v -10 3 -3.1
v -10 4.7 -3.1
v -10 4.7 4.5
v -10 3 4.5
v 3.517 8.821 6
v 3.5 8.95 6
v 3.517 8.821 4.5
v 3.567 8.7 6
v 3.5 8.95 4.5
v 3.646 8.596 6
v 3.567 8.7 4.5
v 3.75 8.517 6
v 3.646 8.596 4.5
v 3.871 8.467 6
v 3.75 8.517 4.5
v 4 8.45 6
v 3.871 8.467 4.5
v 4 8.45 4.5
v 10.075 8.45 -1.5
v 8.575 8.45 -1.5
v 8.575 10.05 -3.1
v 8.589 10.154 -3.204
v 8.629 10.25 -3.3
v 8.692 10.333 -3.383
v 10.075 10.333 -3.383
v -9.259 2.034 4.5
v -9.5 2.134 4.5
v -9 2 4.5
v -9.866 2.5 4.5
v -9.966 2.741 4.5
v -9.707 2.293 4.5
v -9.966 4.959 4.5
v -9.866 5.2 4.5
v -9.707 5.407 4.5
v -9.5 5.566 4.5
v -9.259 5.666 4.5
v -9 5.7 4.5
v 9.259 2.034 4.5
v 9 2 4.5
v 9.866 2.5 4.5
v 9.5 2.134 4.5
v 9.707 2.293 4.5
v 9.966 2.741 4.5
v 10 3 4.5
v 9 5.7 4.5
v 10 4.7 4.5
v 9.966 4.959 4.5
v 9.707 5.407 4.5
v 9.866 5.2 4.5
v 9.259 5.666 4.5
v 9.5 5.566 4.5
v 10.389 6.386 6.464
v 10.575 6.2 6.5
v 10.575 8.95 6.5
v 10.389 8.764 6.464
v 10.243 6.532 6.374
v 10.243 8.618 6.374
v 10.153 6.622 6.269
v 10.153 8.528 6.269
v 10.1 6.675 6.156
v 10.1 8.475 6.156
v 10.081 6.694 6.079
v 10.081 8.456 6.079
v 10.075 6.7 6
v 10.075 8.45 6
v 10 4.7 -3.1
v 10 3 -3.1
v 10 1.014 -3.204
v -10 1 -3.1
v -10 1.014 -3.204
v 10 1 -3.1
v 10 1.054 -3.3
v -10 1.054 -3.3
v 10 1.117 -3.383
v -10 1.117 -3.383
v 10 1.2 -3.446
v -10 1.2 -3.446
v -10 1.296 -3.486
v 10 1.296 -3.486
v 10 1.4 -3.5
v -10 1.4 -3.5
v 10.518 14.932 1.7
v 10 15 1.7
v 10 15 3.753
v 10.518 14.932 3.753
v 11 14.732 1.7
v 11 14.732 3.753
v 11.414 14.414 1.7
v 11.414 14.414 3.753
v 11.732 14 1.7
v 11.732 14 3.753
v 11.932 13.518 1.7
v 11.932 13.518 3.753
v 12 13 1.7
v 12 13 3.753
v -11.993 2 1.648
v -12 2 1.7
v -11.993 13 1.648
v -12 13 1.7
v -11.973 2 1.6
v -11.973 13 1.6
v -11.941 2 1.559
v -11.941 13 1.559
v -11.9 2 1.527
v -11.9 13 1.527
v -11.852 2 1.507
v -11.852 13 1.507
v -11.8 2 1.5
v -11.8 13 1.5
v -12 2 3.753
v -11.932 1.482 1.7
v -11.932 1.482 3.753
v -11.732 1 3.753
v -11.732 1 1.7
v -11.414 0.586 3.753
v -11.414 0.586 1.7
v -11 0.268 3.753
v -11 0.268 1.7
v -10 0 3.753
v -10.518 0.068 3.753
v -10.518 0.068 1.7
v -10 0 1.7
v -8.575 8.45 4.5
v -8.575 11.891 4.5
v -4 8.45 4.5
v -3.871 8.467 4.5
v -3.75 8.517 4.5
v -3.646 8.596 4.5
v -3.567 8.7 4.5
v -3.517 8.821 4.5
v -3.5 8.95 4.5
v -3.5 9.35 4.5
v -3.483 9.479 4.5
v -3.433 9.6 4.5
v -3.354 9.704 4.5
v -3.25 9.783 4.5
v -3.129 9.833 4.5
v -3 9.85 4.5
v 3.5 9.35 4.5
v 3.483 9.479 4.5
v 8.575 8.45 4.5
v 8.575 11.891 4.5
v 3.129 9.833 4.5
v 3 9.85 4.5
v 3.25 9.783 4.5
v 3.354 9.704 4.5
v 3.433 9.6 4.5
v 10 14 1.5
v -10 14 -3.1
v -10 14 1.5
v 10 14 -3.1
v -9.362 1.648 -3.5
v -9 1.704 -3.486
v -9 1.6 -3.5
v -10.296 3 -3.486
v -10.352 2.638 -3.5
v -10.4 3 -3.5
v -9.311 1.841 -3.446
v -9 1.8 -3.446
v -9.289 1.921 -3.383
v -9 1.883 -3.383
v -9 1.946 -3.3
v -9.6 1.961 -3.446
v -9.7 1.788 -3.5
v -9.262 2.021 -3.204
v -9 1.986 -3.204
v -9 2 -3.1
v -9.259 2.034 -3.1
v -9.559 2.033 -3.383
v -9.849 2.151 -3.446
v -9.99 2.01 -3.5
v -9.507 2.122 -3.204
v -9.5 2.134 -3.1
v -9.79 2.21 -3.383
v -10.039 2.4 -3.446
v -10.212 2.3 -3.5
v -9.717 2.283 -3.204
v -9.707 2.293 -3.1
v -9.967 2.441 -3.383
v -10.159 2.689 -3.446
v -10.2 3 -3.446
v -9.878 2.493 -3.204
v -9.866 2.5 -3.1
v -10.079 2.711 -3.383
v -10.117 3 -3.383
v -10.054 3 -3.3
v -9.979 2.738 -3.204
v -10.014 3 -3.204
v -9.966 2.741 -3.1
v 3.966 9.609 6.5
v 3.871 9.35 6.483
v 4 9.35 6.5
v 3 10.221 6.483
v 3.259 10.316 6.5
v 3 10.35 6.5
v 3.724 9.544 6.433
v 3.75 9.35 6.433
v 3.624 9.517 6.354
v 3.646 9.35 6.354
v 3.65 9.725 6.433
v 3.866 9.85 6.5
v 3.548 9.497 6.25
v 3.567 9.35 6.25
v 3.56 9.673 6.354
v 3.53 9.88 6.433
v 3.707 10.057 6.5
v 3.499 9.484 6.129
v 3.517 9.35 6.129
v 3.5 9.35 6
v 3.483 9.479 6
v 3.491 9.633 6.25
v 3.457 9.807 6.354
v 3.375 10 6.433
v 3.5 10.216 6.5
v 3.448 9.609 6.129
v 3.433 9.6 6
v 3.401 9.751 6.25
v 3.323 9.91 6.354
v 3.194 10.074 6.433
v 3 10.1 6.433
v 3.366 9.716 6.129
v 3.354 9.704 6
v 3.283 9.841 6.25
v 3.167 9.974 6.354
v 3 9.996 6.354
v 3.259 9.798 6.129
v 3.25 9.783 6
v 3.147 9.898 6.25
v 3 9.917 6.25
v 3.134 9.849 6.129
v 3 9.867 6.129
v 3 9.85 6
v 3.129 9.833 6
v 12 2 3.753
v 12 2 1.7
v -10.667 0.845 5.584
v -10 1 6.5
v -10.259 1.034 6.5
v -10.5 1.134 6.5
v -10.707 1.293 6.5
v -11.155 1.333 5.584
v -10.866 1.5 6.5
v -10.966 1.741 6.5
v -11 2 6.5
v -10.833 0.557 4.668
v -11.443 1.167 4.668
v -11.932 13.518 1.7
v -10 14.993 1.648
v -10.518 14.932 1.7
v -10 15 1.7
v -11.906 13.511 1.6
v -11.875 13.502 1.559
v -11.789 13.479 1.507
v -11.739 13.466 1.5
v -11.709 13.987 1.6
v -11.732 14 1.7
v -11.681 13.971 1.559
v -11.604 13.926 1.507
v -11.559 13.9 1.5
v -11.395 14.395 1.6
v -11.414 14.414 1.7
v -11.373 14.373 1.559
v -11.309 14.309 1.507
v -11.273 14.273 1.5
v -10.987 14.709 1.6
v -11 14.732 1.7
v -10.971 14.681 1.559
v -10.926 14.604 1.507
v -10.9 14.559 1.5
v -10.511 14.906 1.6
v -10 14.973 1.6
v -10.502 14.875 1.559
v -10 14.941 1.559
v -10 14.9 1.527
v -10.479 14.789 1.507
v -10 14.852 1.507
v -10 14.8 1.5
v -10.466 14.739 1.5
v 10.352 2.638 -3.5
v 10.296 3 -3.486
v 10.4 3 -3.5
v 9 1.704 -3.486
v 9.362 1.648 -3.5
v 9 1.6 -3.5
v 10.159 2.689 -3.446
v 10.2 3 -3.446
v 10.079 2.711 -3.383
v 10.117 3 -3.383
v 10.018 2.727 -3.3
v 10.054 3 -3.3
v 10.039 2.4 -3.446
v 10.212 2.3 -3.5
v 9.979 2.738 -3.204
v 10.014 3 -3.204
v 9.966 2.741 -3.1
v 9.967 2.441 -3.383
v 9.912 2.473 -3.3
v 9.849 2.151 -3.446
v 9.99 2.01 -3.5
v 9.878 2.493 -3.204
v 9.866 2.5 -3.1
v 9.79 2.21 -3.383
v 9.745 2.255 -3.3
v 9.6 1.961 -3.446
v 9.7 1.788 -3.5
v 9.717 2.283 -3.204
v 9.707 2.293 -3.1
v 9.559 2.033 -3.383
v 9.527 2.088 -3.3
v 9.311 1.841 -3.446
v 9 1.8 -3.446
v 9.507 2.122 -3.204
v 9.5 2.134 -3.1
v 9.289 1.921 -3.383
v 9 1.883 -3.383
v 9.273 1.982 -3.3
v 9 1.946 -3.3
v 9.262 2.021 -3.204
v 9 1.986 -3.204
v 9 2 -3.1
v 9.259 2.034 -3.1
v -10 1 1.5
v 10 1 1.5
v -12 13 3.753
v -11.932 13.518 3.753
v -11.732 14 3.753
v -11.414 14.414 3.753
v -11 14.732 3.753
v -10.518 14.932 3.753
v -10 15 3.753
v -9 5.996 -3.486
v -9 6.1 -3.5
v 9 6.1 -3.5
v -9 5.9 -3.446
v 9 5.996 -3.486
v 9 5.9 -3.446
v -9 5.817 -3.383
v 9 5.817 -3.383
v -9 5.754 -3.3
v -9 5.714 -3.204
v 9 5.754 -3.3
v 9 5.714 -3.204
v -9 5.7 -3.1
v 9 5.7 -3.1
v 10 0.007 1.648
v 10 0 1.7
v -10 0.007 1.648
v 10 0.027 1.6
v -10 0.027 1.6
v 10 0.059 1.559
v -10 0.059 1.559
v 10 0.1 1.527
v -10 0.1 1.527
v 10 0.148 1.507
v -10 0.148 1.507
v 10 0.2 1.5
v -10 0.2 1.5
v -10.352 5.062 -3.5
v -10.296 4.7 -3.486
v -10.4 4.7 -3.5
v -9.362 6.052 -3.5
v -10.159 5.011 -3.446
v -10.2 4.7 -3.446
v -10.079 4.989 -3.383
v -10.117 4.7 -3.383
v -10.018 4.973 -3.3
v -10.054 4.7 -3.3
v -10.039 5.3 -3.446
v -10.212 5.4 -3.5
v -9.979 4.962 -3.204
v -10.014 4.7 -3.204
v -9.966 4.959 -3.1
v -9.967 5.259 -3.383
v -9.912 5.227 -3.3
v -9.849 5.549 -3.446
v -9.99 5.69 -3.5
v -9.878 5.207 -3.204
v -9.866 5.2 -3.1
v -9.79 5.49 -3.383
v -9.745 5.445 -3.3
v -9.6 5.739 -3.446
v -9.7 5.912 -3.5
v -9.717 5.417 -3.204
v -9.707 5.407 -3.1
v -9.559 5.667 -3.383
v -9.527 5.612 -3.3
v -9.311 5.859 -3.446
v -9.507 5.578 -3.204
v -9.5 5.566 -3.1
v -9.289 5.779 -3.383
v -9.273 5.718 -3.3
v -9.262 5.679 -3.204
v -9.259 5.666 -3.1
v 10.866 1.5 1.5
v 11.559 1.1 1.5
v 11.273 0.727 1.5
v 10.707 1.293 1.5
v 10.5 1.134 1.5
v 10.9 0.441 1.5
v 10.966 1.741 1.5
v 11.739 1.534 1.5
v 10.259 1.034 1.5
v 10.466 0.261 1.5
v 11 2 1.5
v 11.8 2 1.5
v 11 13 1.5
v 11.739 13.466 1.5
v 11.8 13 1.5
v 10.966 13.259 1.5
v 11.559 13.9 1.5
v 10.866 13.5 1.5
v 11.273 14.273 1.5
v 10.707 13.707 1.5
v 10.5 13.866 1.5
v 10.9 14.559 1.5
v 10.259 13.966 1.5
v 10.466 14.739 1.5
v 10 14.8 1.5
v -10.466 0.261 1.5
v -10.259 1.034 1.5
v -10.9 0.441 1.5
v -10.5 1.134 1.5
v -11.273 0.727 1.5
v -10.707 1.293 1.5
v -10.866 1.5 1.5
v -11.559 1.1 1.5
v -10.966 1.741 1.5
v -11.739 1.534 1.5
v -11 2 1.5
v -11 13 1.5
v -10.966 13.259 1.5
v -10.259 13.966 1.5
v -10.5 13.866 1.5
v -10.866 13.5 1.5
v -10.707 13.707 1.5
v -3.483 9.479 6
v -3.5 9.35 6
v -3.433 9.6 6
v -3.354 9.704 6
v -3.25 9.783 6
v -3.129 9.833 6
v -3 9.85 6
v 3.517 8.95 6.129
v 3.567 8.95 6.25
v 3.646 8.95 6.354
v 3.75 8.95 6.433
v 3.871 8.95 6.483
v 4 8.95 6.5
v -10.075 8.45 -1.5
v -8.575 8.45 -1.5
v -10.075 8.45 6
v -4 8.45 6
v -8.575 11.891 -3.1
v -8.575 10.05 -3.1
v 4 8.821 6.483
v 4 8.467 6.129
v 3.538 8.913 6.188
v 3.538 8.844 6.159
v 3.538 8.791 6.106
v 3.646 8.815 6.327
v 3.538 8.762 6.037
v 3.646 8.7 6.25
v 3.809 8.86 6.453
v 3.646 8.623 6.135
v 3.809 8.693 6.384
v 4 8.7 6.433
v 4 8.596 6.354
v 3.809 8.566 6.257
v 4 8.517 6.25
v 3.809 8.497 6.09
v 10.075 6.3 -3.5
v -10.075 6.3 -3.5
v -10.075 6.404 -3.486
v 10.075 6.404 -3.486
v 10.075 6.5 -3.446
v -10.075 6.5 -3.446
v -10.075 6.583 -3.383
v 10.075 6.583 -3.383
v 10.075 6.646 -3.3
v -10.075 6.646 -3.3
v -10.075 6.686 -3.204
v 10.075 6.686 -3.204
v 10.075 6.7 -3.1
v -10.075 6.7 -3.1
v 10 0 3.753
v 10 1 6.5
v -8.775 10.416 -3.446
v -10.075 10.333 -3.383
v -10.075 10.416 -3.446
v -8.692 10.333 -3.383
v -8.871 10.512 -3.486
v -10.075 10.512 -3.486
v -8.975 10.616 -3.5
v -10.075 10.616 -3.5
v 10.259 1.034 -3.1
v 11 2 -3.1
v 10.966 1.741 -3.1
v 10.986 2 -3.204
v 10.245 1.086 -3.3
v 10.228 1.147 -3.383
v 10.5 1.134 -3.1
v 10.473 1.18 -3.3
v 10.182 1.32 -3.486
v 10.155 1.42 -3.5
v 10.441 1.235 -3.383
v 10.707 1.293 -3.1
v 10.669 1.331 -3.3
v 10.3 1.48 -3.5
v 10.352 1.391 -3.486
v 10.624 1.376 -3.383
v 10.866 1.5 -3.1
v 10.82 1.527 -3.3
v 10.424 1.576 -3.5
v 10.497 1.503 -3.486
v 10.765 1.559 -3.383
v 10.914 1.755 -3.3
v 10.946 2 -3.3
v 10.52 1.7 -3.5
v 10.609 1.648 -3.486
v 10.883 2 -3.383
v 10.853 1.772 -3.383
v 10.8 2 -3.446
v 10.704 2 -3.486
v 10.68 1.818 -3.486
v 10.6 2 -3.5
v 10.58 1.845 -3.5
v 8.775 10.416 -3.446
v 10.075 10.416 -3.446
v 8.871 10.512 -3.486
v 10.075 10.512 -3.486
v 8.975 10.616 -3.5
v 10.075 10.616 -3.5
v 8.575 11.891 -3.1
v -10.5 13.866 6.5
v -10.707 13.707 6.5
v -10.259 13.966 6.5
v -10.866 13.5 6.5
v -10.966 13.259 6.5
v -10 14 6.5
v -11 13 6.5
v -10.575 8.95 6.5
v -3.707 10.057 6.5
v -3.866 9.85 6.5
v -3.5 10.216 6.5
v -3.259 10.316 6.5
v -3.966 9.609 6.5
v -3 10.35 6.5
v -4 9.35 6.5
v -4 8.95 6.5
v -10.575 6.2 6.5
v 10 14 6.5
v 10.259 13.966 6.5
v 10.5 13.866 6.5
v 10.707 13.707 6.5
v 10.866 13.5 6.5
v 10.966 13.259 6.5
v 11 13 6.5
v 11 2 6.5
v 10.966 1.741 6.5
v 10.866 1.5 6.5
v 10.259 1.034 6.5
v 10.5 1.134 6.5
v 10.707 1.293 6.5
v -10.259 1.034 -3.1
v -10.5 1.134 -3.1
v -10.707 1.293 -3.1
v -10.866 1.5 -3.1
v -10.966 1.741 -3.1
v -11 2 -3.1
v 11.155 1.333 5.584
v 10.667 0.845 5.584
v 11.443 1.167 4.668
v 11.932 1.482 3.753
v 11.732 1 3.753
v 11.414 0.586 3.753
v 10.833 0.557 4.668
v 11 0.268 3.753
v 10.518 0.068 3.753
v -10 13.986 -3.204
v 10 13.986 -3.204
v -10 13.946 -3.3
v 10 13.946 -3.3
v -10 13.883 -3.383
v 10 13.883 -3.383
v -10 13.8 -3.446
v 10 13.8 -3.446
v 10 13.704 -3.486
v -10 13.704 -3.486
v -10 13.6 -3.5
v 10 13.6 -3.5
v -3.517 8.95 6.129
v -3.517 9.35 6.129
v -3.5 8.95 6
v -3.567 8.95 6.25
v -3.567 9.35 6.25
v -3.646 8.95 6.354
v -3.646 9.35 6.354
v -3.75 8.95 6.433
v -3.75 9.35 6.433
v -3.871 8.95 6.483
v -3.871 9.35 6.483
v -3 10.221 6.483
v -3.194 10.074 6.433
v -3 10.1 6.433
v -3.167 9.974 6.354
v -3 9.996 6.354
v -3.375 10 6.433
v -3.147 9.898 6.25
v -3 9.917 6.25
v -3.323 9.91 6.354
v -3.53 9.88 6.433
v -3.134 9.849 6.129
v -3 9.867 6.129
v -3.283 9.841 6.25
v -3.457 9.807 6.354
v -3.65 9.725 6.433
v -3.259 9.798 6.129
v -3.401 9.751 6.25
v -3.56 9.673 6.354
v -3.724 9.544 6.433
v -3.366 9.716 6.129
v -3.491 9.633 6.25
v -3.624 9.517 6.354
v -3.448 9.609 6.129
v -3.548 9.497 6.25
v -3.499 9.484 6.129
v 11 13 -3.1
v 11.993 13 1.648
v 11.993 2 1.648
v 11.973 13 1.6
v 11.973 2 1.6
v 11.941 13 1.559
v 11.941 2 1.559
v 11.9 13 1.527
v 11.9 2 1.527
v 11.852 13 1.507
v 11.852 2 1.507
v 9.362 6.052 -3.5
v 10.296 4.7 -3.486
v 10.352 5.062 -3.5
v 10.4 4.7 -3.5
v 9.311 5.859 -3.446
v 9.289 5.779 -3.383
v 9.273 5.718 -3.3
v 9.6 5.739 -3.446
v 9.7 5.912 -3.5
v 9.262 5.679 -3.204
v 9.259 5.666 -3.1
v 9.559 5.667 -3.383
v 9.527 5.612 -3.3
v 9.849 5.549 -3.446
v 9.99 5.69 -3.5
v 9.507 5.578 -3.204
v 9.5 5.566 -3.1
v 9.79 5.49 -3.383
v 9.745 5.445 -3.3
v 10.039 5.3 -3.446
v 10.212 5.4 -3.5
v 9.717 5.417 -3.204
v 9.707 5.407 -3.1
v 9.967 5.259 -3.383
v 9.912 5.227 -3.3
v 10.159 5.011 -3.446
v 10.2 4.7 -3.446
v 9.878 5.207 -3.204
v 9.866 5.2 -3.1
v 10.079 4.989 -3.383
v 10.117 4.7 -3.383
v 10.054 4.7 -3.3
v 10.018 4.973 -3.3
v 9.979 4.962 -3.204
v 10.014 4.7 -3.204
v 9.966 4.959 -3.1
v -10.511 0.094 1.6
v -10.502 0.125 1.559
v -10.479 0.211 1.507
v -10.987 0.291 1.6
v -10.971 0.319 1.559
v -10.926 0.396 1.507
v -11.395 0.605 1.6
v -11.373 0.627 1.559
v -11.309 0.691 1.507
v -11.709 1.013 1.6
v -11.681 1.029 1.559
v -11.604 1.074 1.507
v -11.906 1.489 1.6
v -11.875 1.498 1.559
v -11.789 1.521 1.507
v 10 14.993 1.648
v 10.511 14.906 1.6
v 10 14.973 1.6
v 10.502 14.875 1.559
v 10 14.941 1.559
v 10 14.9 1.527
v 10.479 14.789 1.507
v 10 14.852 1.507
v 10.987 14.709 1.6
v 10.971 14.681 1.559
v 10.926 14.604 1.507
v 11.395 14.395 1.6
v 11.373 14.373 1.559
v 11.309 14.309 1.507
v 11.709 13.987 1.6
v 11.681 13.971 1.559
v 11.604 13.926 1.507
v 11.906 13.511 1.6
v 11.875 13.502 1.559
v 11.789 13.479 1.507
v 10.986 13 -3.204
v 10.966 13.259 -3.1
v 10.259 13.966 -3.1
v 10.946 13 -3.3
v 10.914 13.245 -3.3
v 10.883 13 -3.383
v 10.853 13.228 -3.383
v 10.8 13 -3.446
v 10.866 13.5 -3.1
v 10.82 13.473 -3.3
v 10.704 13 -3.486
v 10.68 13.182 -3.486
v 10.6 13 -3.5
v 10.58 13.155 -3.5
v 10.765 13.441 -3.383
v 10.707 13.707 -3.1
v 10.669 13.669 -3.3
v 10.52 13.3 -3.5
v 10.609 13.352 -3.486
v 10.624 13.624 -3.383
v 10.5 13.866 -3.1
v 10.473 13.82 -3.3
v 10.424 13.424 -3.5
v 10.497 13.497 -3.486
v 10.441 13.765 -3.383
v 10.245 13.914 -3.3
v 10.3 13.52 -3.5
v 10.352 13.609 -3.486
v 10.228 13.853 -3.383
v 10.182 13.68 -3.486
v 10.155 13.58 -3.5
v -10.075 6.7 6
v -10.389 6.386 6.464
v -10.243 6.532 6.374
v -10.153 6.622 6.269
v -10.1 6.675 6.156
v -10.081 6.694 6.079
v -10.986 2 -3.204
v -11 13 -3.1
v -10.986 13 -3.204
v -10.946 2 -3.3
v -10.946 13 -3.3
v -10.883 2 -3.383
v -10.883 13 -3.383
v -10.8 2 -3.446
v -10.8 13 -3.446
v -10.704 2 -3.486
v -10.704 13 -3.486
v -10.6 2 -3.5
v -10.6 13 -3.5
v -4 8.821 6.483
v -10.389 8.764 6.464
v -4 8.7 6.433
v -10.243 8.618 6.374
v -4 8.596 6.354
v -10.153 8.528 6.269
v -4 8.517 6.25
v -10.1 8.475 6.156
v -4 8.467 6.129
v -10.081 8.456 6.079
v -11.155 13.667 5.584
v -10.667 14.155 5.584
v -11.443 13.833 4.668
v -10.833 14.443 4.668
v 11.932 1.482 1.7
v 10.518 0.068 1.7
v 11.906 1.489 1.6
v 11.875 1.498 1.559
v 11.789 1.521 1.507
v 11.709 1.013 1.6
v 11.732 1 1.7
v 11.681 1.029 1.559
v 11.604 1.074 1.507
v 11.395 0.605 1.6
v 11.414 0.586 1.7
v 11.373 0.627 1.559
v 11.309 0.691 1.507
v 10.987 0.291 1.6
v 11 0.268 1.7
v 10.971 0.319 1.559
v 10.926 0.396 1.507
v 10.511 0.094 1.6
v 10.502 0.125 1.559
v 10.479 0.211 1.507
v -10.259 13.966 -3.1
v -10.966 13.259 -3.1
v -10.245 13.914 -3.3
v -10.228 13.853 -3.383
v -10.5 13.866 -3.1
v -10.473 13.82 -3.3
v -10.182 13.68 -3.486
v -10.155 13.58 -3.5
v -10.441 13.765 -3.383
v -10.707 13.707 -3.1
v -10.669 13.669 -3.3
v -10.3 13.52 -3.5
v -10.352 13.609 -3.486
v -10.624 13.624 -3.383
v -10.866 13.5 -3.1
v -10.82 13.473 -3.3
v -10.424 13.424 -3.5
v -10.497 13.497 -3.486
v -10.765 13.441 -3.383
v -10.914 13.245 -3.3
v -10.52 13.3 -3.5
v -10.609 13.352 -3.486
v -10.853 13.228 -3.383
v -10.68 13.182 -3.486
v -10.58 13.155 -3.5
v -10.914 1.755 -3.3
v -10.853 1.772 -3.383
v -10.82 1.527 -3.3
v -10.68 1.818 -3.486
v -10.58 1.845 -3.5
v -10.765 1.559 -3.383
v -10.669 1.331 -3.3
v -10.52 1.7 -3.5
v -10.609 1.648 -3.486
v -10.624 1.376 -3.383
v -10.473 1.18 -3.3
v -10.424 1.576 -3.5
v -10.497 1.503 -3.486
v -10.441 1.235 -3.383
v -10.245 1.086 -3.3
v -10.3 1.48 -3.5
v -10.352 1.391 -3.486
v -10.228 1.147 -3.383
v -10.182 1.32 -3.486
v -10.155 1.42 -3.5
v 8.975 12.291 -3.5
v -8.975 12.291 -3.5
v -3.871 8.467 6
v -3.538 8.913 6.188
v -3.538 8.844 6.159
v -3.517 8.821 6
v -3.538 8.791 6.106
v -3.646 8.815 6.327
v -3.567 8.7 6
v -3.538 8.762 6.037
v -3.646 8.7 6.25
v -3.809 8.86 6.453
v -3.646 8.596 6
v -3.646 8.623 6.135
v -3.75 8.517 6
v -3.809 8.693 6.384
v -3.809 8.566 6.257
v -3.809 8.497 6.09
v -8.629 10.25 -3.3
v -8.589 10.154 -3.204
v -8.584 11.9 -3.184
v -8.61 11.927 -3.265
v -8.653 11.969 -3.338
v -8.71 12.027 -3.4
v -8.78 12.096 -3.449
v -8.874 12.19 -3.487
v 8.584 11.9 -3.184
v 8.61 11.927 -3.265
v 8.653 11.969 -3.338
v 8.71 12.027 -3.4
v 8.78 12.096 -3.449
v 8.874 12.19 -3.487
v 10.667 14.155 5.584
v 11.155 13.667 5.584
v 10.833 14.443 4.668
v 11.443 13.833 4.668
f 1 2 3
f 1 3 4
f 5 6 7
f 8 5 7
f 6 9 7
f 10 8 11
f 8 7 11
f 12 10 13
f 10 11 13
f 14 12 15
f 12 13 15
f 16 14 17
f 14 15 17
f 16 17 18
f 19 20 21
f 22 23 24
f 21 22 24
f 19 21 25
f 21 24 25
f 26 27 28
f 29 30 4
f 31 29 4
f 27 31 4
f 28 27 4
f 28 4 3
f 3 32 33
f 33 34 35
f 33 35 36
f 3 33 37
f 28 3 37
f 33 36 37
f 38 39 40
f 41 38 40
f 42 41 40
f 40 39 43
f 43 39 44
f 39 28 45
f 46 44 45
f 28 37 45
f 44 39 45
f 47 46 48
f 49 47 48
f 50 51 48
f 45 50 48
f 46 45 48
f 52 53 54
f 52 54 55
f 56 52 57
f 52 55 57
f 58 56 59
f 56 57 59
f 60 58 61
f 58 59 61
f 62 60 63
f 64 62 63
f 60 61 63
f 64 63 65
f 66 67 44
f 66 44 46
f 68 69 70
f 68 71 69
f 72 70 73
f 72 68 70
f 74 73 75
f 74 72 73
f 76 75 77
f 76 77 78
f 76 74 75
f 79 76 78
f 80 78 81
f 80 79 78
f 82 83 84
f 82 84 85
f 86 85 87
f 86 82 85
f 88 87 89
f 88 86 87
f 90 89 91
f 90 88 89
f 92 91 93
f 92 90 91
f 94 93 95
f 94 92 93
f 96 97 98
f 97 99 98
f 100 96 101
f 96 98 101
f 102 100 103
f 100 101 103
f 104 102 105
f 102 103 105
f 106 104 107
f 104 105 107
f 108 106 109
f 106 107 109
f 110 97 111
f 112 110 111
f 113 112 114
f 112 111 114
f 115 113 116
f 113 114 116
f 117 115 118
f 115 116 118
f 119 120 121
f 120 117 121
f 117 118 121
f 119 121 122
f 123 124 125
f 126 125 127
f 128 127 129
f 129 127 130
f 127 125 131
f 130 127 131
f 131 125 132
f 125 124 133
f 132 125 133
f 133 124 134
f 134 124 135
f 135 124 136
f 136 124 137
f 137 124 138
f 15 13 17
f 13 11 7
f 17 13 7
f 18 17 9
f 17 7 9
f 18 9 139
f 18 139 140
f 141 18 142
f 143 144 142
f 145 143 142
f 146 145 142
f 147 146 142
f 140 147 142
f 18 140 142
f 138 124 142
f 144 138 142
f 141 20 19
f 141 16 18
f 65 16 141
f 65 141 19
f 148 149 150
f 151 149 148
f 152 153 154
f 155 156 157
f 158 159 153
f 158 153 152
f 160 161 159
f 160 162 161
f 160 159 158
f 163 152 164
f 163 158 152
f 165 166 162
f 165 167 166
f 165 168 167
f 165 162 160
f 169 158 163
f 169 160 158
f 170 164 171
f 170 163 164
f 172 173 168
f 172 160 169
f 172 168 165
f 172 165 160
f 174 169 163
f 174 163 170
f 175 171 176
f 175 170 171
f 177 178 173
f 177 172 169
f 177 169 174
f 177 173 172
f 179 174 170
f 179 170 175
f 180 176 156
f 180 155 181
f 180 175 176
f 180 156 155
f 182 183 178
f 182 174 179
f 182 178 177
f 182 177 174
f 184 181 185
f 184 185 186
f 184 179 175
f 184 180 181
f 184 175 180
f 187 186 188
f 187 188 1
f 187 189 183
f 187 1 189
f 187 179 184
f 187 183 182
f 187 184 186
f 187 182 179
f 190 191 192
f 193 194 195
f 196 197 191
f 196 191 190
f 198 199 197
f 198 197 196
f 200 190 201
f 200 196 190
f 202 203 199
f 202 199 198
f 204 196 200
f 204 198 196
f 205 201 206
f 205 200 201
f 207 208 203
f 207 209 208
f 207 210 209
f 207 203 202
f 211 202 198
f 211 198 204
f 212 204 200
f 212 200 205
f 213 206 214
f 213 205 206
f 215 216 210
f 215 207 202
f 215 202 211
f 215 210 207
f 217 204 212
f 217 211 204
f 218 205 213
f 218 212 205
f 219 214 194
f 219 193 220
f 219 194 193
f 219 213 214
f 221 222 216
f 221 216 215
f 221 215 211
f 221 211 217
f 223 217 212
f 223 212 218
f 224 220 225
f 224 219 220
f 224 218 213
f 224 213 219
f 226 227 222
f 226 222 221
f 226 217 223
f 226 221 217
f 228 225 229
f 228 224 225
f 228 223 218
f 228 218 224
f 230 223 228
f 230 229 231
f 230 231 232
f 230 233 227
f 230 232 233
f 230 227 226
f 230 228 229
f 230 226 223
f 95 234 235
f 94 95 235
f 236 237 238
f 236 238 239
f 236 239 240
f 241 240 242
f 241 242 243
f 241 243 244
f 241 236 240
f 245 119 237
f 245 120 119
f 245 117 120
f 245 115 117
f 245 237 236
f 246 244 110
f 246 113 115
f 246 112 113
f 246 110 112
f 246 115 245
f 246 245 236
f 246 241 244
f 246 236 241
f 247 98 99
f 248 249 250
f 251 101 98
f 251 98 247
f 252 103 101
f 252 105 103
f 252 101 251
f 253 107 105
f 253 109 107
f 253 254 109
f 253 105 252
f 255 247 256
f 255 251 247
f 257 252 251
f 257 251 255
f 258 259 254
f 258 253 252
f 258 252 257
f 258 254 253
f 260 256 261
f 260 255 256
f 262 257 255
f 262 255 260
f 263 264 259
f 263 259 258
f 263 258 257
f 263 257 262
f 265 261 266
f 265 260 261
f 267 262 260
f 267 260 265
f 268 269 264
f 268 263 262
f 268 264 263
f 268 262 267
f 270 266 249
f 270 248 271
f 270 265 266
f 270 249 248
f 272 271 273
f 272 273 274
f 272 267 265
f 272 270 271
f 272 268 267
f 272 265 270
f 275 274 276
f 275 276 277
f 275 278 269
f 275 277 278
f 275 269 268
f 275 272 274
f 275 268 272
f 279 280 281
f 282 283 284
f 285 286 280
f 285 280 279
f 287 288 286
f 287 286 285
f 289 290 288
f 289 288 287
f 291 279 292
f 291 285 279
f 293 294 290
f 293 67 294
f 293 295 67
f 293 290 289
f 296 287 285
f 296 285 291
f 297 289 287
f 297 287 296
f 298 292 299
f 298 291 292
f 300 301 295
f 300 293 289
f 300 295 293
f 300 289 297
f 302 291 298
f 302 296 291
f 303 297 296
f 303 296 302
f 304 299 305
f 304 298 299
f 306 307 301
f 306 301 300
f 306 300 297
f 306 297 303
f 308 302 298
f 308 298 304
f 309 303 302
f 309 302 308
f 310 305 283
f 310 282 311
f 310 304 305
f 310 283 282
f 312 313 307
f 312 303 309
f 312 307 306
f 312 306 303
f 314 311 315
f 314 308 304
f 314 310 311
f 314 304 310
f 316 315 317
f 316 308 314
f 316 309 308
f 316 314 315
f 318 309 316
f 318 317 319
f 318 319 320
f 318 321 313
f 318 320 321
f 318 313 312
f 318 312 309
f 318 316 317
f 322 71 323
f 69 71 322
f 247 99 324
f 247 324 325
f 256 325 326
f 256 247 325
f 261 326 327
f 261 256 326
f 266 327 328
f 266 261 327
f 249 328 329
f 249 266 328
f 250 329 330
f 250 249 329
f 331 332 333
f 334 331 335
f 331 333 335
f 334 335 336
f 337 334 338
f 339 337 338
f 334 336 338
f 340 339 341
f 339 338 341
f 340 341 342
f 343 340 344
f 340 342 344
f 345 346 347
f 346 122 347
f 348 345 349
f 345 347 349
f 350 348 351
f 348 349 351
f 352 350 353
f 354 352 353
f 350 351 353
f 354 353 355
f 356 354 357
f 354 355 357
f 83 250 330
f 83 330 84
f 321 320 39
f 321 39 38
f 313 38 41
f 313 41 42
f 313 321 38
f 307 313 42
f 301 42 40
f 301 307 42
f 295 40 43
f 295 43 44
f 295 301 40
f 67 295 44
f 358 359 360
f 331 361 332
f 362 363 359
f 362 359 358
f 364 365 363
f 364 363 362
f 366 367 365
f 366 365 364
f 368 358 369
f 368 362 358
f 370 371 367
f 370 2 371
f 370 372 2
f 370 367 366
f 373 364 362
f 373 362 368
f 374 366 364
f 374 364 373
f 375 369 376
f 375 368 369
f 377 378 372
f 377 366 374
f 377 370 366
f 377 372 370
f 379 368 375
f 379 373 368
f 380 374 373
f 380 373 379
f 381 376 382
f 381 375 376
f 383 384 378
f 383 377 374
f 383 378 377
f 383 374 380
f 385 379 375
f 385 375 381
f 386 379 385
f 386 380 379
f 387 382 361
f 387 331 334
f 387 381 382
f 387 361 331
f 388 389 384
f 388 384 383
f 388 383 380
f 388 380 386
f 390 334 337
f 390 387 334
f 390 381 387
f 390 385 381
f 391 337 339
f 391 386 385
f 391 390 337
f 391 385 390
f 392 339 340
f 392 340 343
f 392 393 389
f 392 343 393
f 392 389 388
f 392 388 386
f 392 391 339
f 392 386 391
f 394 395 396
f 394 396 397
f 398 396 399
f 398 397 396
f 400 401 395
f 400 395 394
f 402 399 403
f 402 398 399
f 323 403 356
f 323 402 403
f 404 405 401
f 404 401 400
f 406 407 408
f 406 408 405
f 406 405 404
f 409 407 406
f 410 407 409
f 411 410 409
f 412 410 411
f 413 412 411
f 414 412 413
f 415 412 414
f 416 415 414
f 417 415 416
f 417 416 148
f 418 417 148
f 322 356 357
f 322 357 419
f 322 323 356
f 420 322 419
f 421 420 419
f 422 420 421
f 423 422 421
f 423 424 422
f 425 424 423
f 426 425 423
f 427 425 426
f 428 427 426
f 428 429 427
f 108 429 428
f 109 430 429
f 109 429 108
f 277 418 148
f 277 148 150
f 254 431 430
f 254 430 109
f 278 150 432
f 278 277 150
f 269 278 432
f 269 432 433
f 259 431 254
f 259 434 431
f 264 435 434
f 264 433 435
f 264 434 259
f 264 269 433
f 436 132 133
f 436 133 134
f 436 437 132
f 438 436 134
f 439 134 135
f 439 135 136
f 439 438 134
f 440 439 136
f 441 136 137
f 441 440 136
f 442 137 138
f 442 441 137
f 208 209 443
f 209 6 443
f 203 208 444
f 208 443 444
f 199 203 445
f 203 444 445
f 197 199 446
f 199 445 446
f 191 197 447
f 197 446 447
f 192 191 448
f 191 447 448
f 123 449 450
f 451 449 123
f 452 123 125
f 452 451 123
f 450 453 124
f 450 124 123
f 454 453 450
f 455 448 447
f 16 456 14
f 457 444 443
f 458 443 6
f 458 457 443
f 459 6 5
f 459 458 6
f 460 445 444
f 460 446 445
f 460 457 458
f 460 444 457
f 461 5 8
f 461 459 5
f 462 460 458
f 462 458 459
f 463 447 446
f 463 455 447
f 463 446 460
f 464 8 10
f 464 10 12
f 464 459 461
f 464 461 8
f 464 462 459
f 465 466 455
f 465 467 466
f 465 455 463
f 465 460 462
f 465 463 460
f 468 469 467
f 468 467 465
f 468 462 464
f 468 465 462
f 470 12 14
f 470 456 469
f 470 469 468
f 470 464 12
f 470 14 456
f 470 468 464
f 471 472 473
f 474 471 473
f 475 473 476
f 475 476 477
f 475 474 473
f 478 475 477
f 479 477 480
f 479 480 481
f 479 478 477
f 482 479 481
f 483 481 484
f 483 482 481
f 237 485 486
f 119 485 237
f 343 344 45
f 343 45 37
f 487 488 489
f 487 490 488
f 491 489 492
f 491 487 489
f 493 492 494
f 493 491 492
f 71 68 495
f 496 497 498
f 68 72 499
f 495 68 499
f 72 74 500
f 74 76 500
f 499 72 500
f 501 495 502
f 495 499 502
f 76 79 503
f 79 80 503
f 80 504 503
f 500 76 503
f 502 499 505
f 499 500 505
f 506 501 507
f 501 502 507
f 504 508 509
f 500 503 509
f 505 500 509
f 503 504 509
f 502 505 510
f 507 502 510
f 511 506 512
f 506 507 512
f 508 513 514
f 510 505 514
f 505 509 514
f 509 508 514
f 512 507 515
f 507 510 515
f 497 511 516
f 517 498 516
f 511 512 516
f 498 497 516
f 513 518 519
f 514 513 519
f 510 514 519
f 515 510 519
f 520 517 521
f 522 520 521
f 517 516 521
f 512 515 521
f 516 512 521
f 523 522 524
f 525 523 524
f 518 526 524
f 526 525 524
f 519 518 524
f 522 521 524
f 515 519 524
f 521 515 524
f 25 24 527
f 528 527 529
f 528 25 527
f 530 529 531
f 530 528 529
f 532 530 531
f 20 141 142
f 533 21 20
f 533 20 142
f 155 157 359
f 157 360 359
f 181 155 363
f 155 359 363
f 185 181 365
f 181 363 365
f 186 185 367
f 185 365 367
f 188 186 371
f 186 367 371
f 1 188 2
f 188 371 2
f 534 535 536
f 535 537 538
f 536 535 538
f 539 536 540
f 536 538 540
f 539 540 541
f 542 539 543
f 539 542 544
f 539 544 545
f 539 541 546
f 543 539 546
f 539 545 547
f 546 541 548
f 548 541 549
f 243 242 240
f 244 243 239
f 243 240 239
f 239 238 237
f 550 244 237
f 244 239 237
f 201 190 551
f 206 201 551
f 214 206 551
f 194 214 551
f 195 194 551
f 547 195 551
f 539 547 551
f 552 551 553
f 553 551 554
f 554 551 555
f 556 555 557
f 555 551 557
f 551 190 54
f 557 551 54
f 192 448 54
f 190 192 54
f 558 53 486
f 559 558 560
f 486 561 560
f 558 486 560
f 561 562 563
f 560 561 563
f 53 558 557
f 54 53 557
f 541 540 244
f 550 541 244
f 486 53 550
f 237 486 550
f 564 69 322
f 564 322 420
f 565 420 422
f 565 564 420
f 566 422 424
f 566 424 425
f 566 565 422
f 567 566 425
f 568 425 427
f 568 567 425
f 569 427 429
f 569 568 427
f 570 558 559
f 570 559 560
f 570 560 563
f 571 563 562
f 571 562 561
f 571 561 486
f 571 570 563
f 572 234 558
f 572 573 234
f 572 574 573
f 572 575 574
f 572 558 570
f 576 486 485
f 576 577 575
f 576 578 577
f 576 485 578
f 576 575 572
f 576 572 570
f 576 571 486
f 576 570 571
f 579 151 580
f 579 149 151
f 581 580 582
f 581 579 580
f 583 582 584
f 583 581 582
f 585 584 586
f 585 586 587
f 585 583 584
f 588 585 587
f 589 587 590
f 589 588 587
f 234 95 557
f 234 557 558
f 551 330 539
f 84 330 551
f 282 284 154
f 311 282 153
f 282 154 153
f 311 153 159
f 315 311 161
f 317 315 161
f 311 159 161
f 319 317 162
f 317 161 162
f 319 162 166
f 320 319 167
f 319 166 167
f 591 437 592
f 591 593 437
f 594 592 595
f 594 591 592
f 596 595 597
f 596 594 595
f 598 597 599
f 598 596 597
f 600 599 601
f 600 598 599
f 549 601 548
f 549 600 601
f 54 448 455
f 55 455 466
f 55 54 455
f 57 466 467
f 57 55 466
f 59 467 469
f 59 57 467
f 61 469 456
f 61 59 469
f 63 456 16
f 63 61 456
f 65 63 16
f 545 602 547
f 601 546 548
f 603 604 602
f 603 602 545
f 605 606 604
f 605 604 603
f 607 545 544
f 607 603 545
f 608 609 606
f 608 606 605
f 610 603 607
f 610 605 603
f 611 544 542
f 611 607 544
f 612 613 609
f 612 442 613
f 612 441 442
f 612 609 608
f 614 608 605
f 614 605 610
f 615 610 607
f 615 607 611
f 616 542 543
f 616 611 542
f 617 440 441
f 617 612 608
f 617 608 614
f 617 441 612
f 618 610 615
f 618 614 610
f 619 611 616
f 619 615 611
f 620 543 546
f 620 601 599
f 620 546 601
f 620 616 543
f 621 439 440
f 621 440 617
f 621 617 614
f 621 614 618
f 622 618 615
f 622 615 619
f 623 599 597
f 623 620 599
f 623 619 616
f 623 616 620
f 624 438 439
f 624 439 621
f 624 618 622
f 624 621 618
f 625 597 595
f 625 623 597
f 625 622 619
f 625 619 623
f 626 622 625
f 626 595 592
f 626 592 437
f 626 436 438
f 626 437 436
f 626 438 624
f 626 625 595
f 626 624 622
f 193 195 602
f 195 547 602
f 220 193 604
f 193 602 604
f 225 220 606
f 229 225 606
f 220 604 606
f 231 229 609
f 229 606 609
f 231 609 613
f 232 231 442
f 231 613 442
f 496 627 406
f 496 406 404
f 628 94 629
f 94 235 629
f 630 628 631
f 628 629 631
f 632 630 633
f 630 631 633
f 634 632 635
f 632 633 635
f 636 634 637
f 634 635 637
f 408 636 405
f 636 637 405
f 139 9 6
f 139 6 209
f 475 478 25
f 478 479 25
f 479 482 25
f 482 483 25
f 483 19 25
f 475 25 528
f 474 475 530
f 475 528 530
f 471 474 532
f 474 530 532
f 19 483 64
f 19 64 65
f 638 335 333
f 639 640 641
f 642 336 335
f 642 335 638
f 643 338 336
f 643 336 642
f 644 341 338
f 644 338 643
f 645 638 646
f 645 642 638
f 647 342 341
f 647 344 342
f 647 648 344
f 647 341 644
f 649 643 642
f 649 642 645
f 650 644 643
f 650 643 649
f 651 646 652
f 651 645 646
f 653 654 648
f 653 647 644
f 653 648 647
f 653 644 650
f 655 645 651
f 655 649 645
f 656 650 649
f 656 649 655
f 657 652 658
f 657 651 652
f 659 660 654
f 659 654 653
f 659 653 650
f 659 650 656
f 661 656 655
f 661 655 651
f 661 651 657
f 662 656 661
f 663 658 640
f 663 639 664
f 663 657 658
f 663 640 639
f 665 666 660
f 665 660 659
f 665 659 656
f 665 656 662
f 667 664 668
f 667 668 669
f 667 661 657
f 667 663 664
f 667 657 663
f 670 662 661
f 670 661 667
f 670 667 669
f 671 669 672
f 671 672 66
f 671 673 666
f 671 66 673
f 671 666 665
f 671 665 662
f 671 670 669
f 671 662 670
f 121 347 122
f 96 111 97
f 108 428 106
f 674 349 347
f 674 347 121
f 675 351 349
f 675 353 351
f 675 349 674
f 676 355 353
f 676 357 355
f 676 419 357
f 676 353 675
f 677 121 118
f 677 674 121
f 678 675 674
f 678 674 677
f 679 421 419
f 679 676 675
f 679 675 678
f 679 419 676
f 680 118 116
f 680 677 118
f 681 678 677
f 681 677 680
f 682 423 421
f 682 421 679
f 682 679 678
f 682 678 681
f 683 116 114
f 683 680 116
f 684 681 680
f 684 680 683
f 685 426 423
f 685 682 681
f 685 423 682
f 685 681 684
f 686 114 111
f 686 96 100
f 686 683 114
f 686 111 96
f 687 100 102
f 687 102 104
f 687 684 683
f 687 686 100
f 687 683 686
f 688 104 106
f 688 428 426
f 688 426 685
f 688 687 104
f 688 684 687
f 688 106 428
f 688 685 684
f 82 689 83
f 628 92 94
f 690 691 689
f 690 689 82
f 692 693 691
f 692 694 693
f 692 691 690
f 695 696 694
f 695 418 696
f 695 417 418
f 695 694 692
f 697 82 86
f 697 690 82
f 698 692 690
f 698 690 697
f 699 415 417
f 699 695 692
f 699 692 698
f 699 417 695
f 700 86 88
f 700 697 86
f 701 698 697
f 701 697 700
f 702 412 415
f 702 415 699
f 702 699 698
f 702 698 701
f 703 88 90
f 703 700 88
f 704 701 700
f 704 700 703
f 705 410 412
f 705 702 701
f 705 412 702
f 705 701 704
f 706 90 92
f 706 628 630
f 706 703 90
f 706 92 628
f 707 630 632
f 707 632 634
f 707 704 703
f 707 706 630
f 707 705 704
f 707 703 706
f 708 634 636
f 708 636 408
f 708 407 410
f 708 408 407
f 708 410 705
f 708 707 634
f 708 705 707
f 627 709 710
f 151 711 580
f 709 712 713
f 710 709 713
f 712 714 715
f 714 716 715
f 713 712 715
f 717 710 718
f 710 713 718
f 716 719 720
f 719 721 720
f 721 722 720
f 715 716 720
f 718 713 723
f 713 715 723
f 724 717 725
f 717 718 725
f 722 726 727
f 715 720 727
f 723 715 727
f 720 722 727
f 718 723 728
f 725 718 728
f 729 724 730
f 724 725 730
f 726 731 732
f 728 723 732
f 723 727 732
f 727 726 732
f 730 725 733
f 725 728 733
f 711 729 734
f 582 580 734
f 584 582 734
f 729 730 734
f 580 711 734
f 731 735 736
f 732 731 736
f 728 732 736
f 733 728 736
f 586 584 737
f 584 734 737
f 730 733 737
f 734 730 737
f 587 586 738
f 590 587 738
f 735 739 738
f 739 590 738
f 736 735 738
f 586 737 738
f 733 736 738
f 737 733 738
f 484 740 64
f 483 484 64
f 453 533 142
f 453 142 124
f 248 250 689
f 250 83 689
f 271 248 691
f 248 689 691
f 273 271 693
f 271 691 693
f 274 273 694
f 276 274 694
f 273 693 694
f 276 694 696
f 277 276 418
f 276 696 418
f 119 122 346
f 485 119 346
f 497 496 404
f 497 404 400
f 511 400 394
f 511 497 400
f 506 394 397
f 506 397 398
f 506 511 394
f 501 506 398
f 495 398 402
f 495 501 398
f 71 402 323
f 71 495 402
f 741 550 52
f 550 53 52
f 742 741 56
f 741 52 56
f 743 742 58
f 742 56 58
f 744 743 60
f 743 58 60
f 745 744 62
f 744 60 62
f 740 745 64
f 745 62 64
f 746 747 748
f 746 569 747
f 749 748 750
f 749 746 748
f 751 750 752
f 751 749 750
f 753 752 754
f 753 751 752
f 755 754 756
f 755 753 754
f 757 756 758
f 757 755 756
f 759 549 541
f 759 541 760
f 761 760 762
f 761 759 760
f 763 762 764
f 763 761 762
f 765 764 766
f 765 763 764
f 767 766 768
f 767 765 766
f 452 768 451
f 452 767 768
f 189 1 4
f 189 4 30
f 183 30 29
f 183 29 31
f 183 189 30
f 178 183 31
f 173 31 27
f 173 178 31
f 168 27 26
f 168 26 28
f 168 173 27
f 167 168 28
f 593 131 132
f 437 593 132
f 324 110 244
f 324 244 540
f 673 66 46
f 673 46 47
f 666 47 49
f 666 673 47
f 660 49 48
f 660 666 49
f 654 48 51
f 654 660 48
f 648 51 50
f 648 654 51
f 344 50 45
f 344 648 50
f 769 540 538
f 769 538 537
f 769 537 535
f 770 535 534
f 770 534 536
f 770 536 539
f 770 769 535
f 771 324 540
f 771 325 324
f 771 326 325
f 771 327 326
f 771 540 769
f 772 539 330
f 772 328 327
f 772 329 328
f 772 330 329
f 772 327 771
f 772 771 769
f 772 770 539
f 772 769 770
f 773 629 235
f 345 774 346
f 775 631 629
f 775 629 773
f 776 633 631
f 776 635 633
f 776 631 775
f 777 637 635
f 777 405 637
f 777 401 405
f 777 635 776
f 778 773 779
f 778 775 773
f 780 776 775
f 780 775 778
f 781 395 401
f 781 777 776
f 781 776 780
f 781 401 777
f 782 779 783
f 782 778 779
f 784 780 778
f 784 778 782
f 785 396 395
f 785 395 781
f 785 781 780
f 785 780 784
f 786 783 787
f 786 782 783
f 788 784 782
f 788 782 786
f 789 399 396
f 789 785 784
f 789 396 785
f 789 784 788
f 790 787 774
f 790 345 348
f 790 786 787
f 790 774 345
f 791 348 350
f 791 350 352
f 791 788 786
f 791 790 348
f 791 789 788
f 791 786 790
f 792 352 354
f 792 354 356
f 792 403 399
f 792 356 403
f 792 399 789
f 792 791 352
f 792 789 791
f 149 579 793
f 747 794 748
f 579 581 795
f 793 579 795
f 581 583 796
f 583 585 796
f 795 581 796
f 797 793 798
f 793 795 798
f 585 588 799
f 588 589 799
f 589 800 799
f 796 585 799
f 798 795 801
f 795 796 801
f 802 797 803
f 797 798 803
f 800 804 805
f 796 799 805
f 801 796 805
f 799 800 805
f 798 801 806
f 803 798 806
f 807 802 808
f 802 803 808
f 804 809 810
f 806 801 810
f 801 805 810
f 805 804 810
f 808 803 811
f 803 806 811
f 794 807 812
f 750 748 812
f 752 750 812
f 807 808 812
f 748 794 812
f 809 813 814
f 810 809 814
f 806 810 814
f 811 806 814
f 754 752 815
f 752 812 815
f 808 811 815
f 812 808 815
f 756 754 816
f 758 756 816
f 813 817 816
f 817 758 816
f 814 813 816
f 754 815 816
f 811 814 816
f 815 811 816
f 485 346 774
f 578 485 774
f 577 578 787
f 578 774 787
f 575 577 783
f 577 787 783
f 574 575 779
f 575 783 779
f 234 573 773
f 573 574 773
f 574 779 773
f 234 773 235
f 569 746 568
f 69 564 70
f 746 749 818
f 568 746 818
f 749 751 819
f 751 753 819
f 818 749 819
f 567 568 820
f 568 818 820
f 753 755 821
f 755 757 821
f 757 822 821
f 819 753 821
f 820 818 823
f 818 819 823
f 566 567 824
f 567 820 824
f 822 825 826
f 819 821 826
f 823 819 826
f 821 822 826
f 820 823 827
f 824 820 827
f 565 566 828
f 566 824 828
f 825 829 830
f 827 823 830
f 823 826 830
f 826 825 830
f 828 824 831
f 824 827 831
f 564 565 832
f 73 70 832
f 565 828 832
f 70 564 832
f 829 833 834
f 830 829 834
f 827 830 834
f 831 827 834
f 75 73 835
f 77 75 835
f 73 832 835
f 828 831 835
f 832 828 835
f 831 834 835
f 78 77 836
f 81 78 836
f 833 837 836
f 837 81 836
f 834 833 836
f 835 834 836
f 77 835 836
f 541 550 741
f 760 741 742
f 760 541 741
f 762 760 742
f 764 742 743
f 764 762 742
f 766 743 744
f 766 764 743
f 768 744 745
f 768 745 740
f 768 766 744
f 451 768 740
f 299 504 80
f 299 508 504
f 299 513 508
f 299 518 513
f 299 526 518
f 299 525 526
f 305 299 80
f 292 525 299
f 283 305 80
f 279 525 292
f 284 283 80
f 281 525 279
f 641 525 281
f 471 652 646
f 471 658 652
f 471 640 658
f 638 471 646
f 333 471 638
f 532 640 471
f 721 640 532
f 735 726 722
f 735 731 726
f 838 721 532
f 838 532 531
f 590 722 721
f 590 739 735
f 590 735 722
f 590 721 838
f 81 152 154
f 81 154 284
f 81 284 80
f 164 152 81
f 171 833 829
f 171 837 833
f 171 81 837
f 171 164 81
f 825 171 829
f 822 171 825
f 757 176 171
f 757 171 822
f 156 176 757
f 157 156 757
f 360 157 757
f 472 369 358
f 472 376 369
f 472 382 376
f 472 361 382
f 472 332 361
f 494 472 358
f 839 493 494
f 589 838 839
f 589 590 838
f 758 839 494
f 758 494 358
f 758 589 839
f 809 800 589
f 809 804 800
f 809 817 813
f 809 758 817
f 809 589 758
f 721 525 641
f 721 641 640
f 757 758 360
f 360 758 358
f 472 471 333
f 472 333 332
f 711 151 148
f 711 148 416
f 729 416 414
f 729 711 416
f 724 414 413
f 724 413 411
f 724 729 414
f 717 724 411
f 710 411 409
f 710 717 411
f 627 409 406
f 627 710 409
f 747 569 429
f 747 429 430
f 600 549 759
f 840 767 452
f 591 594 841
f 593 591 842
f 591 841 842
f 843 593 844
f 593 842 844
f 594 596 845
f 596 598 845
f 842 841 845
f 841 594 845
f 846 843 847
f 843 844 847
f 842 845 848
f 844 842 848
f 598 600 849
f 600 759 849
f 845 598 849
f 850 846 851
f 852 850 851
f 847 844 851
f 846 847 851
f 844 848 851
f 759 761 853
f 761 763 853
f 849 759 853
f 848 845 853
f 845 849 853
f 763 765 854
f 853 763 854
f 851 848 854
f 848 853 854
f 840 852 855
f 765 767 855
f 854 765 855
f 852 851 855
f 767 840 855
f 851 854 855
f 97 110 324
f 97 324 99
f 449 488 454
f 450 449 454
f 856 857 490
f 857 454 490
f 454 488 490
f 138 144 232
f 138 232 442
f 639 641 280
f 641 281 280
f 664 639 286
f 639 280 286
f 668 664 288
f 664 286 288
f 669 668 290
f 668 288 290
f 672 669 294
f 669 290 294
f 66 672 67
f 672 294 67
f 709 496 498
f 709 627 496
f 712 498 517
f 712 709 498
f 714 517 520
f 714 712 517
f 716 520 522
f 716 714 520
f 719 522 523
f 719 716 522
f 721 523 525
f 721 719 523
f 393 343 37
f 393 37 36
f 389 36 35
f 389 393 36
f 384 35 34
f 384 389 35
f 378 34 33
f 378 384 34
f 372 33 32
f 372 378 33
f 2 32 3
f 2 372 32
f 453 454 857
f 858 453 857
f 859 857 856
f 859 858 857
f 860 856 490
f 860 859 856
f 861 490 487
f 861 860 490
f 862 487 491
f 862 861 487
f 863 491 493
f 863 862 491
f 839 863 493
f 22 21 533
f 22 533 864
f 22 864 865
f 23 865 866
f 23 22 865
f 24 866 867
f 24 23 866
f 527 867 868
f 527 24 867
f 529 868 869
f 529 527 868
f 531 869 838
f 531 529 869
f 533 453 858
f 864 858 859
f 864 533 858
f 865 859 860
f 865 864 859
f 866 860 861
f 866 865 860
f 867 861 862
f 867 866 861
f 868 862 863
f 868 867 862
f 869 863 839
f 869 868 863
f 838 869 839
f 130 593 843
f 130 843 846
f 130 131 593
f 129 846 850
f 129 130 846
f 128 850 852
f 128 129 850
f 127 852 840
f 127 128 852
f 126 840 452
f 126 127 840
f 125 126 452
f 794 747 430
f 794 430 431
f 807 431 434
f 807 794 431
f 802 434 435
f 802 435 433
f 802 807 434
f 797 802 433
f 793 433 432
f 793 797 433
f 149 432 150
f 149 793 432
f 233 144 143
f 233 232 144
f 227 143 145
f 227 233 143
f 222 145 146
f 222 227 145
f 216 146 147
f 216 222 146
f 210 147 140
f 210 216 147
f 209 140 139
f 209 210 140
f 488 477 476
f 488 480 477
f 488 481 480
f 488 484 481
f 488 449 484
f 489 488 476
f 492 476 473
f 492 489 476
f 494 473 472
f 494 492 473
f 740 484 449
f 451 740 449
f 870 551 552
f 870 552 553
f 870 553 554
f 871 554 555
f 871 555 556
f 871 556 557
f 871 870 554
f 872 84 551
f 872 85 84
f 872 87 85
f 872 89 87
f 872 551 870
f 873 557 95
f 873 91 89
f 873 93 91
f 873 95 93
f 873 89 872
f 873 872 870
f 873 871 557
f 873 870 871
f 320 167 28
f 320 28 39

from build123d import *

# Parameters (mm, degrees)
SKETCH1_W           = 24
SKETCH1_H           = 13
BOSS_EXTRUDE1_DEPTH = 15
SKETCH2_W           = 20.15
SKETCH2_H           = 1.75
CUT_EXTRUDE1_DEPTH  = 15
FILLET1_R           = 2
CHAMFER2_SIZE       = 1
CHAMFER2_SIZE2      = 2.747477419
FILLET2_R           = 0.5
CUT_EXTRUDE4_DEPTH  = 11
SKETCH5_W           = 26.855674208
SKETCH5_H           = 19.307728506
CUT_EXTRUDE5_DEPTH  = 8
CUT_EXTRUDE6_DEPTH  = 11
SKETCH7_W           = 29.982721697
SKETCH7_H           = 21.559004648
CUT_EXTRUDE7_DEPTH  = 3
CHAMFER3_SIZE       = 2
FILLET3_R           = 0.4
FILLET4_R           = 0.2
SKETCH8_W           = 7
SKETCH8_H           = 2.8
CUT_EXTRUDE8_DEPTH  = 21.808652047
FILLET5_R           = 0.5


with BuildPart() as part:
    # Sketch1 → Boss-Extrude1 (new body)
    with BuildSketch(Plane(origin=(0, 0, 0), x_dir=(1, 0, 0), z_dir=(0, 1, 0))):
        Rectangle(SKETCH1_W, SKETCH1_H)
    extrude(amount=BOSS_EXTRUDE1_DEPTH)

    # Sketch2 → Cut-Extrude1 (cut)
    with BuildSketch(Plane.XY.offset(6.5)):
        with Locations((0, 7.575)):
            Rectangle(SKETCH2_W, SKETCH2_H)
    extrude(amount=-CUT_EXTRUDE1_DEPTH, mode=Mode.SUBTRACT)

    # Fillet1
    fillet1_edges = [part.edges().sort_by_distance(p)[0] for p in [
        (-12, 15, 0),
        (12, 15, 0),
        (-12, 0, 0),
        (12, 0, 0),
    ]]
    fillet(fillet1_edges, radius=FILLET1_R)

    # Chamfer2
    chamfer2_edges = [part.edges().sort_by_distance(p)[0] for p in [
        (0, 15, 6.5),
        (12, 7.5, 6.5),
        (0, 0, 6.5),
        (-12, 7.5, 6.5),
        (-11.414213562, 14.414213562, 6.5),
        (-11.414213562, 0.585786438, 6.5),
        (11.414213562, 0.585786438, 6.5),
        (11.414213562, 14.414213562, 6.5),
    ]]
    chamfer2_side = [part.faces().sort_by_distance(p)[0] for p in [
        (11.716980566, 7.5, 6.5),
    ]]
    chamfer(chamfer2_edges, length=CHAMFER2_SIZE, length2=CHAMFER2_SIZE2, reference=chamfer2_side[0])

    # Fillet2
    fillet2_edges = [part.edges().sort_by_distance(p)[0] for p in [
        (10.075, 7.575, 6.5),
        (0, 8.45, 6.5),
        (-10.075, 7.575, 6.5),
        (0, 6.7, 6.5),
    ]]
    fillet(fillet2_edges, radius=FILLET2_R)

    # Sketch4 → Cut-Extrude4 (cut)
    with BuildSketch(Plane(origin=(0, 0, -6.5), x_dir=(-1, 0, 0), z_dir=(0, 0, -1))):
        Polygon((-10.075, 8.45), (-8.575, 8.45), (-8.575, 11.891155889), (8.575, 11.891155889), (8.575, 8.45), (10.075, 8.45), (10.075, 6.7), (-10.075, 6.7), align=None)
    extrude(amount=-CUT_EXTRUDE4_DEPTH, mode=Mode.SUBTRACT)

    # Sketch5 → Cut-Extrude5 (cut)
    with BuildSketch(Plane(origin=(0, 0, -6.5), x_dir=(-1, 0, 0), z_dir=(0, 0, -1))):
        with Locations((-0.083402715, 7.762018115)):
            Rectangle(SKETCH5_W, SKETCH5_H)
        with BuildLine():
            Line((10, 14), (-10, 14))
            ThreePointArc((-10, 14), (-10.707106781, 13.707106781), (-11, 13))
            Line((-11, 13), (-11, 2))
            ThreePointArc((-11, 2), (-10.707106781, 1.292893219), (-10, 1))
            Line((-10, 1), (10, 1))
            ThreePointArc((10, 1), (10.707106781, 1.292893219), (11, 2))
            Line((11, 2), (11, 13))
            ThreePointArc((11, 13), (10.707106781, 13.707106781), (10, 14))
        make_face(mode=Mode.SUBTRACT)
    extrude(amount=-CUT_EXTRUDE5_DEPTH, mode=Mode.SUBTRACT)

    # Sketch6 → Cut-Extrude6 (cut)
    with BuildSketch(Plane(origin=(0, 0, -6.5), x_dir=(-1, 0, 0), z_dir=(0, 0, -1))):
        with BuildLine():
            Line((-9, 5.7), (9, 5.7))
            ThreePointArc((9, 5.7), (9.707106781, 5.407106781), (10, 4.7))
            Line((10, 4.7), (10, 3))
            ThreePointArc((10, 3), (9.707106781, 2.292893219), (9, 2))
            Line((9, 2), (-9, 2))
            ThreePointArc((-9, 2), (-9.707106781, 2.292893219), (-10, 3))
            Line((-10, 3), (-10, 4.7))
            ThreePointArc((-10, 4.7), (-9.707106781, 5.407106781), (-9, 5.7))
        make_face()
    extrude(amount=-CUT_EXTRUDE6_DEPTH, mode=Mode.SUBTRACT)

    # Sketch7 → Cut-Extrude7 (cut)
    with BuildSketch(Plane(origin=(0, 0, -6.5), x_dir=(-1, 0, 0), z_dir=(0, 0, -1))):
        with Locations((0.615824589, 7.279559508)):
            Rectangle(SKETCH7_W, SKETCH7_H)
    extrude(amount=-CUT_EXTRUDE7_DEPTH, mode=Mode.SUBTRACT)

    # Chamfer3
    chamfer3_edges = [part.edges().sort_by_distance(p)[0] for p in [
        (9.325, 8.45, -3.5),
        (-9.325, 8.45, -3.5),
    ]]
    chamfer(chamfer3_edges, length=CHAMFER3_SIZE)

    # Fillet3
    fillet3_edges = [part.edges().sort_by_distance(p)[0] for p in [
        (-10, 3.85, -3.5),
        (0, 14, -3.5),
        (-10.707106781, 13.707106781, -3.5),
        (-11, 7.5, -3.5),
        (-10.707106781, 1.292893219, -3.5),
        (0, 1, -3.5),
        (10.707106781, 1.292893219, -3.5),
        (11, 7.5, -3.5),
        (10.707106781, 13.707106781, -3.5),
        (0, 6.7, -3.5),
        (0, 11.891155889, -3.5),
        (-8.575, 11.170577944, -3.5),
        (-9.707106781, 2.292893219, -3.5),
        (0, 2, -3.5),
        (9.707106781, 2.292893219, -3.5),
        (10, 3.85, -3.5),
        (9.707106781, 5.407106781, -3.5),
        (0, 5.7, -3.5),
        (-9.707106781, 5.407106781, -3.5),
        (8.575, 11.170577944, -3.5),
        (-9.325, 10.45, -3.5),
        (9.325, 10.45, -3.5),
    ]]
    fillet(fillet3_edges, radius=FILLET3_R)

    # Fillet4
    fillet4_edges = [part.edges().sort_by_distance(p)[0] for p in [
        (-11.414213562, 14.414213562, 1.5),
        (0, 0, 1.5),
        (-12, 7.5, 1.5),
        (12, 7.5, 1.5),
        (11.414213562, 0.585786438, 1.5),
        (11.414213562, 14.414213562, 1.5),
        (0, 15, 1.5),
        (-11.414213562, 0.585786438, 1.5),
    ]]
    fillet(fillet4_edges, radius=FILLET4_R)

    # Sketch8 → Cut-Extrude8 (cut, through all)
    with BuildSketch(Plane(origin=(0, 0, 4.5), x_dir=(-1, 0, 0), z_dir=(0, 0, -1))):
        with Locations((0, 8.45)):
            Rectangle(SKETCH8_W, SKETCH8_H)
    extrude(amount=-CUT_EXTRUDE8_DEPTH, mode=Mode.SUBTRACT)

    # Fillet5
    fillet5_edges = [part.edges().sort_by_distance(p)[0] for p in [
        (-3.5, 8.45, 5.25),
        (-3.5, 9.4, 6.5),
        (-3.5, 9.85, 5.5),
        (3.5, 8.45, 5.25),
        (3.5, 9.4, 6.5),
        (-3.5, 8.596446609, 6.353553391),
        (3.5, 8.596446609, 6.353553391),
        (0, 9.85, 6.5),
        (3.5, 9.85, 5.5),
    ]]
    fillet(fillet5_edges, radius=FILLET5_R)


solid = part.part
